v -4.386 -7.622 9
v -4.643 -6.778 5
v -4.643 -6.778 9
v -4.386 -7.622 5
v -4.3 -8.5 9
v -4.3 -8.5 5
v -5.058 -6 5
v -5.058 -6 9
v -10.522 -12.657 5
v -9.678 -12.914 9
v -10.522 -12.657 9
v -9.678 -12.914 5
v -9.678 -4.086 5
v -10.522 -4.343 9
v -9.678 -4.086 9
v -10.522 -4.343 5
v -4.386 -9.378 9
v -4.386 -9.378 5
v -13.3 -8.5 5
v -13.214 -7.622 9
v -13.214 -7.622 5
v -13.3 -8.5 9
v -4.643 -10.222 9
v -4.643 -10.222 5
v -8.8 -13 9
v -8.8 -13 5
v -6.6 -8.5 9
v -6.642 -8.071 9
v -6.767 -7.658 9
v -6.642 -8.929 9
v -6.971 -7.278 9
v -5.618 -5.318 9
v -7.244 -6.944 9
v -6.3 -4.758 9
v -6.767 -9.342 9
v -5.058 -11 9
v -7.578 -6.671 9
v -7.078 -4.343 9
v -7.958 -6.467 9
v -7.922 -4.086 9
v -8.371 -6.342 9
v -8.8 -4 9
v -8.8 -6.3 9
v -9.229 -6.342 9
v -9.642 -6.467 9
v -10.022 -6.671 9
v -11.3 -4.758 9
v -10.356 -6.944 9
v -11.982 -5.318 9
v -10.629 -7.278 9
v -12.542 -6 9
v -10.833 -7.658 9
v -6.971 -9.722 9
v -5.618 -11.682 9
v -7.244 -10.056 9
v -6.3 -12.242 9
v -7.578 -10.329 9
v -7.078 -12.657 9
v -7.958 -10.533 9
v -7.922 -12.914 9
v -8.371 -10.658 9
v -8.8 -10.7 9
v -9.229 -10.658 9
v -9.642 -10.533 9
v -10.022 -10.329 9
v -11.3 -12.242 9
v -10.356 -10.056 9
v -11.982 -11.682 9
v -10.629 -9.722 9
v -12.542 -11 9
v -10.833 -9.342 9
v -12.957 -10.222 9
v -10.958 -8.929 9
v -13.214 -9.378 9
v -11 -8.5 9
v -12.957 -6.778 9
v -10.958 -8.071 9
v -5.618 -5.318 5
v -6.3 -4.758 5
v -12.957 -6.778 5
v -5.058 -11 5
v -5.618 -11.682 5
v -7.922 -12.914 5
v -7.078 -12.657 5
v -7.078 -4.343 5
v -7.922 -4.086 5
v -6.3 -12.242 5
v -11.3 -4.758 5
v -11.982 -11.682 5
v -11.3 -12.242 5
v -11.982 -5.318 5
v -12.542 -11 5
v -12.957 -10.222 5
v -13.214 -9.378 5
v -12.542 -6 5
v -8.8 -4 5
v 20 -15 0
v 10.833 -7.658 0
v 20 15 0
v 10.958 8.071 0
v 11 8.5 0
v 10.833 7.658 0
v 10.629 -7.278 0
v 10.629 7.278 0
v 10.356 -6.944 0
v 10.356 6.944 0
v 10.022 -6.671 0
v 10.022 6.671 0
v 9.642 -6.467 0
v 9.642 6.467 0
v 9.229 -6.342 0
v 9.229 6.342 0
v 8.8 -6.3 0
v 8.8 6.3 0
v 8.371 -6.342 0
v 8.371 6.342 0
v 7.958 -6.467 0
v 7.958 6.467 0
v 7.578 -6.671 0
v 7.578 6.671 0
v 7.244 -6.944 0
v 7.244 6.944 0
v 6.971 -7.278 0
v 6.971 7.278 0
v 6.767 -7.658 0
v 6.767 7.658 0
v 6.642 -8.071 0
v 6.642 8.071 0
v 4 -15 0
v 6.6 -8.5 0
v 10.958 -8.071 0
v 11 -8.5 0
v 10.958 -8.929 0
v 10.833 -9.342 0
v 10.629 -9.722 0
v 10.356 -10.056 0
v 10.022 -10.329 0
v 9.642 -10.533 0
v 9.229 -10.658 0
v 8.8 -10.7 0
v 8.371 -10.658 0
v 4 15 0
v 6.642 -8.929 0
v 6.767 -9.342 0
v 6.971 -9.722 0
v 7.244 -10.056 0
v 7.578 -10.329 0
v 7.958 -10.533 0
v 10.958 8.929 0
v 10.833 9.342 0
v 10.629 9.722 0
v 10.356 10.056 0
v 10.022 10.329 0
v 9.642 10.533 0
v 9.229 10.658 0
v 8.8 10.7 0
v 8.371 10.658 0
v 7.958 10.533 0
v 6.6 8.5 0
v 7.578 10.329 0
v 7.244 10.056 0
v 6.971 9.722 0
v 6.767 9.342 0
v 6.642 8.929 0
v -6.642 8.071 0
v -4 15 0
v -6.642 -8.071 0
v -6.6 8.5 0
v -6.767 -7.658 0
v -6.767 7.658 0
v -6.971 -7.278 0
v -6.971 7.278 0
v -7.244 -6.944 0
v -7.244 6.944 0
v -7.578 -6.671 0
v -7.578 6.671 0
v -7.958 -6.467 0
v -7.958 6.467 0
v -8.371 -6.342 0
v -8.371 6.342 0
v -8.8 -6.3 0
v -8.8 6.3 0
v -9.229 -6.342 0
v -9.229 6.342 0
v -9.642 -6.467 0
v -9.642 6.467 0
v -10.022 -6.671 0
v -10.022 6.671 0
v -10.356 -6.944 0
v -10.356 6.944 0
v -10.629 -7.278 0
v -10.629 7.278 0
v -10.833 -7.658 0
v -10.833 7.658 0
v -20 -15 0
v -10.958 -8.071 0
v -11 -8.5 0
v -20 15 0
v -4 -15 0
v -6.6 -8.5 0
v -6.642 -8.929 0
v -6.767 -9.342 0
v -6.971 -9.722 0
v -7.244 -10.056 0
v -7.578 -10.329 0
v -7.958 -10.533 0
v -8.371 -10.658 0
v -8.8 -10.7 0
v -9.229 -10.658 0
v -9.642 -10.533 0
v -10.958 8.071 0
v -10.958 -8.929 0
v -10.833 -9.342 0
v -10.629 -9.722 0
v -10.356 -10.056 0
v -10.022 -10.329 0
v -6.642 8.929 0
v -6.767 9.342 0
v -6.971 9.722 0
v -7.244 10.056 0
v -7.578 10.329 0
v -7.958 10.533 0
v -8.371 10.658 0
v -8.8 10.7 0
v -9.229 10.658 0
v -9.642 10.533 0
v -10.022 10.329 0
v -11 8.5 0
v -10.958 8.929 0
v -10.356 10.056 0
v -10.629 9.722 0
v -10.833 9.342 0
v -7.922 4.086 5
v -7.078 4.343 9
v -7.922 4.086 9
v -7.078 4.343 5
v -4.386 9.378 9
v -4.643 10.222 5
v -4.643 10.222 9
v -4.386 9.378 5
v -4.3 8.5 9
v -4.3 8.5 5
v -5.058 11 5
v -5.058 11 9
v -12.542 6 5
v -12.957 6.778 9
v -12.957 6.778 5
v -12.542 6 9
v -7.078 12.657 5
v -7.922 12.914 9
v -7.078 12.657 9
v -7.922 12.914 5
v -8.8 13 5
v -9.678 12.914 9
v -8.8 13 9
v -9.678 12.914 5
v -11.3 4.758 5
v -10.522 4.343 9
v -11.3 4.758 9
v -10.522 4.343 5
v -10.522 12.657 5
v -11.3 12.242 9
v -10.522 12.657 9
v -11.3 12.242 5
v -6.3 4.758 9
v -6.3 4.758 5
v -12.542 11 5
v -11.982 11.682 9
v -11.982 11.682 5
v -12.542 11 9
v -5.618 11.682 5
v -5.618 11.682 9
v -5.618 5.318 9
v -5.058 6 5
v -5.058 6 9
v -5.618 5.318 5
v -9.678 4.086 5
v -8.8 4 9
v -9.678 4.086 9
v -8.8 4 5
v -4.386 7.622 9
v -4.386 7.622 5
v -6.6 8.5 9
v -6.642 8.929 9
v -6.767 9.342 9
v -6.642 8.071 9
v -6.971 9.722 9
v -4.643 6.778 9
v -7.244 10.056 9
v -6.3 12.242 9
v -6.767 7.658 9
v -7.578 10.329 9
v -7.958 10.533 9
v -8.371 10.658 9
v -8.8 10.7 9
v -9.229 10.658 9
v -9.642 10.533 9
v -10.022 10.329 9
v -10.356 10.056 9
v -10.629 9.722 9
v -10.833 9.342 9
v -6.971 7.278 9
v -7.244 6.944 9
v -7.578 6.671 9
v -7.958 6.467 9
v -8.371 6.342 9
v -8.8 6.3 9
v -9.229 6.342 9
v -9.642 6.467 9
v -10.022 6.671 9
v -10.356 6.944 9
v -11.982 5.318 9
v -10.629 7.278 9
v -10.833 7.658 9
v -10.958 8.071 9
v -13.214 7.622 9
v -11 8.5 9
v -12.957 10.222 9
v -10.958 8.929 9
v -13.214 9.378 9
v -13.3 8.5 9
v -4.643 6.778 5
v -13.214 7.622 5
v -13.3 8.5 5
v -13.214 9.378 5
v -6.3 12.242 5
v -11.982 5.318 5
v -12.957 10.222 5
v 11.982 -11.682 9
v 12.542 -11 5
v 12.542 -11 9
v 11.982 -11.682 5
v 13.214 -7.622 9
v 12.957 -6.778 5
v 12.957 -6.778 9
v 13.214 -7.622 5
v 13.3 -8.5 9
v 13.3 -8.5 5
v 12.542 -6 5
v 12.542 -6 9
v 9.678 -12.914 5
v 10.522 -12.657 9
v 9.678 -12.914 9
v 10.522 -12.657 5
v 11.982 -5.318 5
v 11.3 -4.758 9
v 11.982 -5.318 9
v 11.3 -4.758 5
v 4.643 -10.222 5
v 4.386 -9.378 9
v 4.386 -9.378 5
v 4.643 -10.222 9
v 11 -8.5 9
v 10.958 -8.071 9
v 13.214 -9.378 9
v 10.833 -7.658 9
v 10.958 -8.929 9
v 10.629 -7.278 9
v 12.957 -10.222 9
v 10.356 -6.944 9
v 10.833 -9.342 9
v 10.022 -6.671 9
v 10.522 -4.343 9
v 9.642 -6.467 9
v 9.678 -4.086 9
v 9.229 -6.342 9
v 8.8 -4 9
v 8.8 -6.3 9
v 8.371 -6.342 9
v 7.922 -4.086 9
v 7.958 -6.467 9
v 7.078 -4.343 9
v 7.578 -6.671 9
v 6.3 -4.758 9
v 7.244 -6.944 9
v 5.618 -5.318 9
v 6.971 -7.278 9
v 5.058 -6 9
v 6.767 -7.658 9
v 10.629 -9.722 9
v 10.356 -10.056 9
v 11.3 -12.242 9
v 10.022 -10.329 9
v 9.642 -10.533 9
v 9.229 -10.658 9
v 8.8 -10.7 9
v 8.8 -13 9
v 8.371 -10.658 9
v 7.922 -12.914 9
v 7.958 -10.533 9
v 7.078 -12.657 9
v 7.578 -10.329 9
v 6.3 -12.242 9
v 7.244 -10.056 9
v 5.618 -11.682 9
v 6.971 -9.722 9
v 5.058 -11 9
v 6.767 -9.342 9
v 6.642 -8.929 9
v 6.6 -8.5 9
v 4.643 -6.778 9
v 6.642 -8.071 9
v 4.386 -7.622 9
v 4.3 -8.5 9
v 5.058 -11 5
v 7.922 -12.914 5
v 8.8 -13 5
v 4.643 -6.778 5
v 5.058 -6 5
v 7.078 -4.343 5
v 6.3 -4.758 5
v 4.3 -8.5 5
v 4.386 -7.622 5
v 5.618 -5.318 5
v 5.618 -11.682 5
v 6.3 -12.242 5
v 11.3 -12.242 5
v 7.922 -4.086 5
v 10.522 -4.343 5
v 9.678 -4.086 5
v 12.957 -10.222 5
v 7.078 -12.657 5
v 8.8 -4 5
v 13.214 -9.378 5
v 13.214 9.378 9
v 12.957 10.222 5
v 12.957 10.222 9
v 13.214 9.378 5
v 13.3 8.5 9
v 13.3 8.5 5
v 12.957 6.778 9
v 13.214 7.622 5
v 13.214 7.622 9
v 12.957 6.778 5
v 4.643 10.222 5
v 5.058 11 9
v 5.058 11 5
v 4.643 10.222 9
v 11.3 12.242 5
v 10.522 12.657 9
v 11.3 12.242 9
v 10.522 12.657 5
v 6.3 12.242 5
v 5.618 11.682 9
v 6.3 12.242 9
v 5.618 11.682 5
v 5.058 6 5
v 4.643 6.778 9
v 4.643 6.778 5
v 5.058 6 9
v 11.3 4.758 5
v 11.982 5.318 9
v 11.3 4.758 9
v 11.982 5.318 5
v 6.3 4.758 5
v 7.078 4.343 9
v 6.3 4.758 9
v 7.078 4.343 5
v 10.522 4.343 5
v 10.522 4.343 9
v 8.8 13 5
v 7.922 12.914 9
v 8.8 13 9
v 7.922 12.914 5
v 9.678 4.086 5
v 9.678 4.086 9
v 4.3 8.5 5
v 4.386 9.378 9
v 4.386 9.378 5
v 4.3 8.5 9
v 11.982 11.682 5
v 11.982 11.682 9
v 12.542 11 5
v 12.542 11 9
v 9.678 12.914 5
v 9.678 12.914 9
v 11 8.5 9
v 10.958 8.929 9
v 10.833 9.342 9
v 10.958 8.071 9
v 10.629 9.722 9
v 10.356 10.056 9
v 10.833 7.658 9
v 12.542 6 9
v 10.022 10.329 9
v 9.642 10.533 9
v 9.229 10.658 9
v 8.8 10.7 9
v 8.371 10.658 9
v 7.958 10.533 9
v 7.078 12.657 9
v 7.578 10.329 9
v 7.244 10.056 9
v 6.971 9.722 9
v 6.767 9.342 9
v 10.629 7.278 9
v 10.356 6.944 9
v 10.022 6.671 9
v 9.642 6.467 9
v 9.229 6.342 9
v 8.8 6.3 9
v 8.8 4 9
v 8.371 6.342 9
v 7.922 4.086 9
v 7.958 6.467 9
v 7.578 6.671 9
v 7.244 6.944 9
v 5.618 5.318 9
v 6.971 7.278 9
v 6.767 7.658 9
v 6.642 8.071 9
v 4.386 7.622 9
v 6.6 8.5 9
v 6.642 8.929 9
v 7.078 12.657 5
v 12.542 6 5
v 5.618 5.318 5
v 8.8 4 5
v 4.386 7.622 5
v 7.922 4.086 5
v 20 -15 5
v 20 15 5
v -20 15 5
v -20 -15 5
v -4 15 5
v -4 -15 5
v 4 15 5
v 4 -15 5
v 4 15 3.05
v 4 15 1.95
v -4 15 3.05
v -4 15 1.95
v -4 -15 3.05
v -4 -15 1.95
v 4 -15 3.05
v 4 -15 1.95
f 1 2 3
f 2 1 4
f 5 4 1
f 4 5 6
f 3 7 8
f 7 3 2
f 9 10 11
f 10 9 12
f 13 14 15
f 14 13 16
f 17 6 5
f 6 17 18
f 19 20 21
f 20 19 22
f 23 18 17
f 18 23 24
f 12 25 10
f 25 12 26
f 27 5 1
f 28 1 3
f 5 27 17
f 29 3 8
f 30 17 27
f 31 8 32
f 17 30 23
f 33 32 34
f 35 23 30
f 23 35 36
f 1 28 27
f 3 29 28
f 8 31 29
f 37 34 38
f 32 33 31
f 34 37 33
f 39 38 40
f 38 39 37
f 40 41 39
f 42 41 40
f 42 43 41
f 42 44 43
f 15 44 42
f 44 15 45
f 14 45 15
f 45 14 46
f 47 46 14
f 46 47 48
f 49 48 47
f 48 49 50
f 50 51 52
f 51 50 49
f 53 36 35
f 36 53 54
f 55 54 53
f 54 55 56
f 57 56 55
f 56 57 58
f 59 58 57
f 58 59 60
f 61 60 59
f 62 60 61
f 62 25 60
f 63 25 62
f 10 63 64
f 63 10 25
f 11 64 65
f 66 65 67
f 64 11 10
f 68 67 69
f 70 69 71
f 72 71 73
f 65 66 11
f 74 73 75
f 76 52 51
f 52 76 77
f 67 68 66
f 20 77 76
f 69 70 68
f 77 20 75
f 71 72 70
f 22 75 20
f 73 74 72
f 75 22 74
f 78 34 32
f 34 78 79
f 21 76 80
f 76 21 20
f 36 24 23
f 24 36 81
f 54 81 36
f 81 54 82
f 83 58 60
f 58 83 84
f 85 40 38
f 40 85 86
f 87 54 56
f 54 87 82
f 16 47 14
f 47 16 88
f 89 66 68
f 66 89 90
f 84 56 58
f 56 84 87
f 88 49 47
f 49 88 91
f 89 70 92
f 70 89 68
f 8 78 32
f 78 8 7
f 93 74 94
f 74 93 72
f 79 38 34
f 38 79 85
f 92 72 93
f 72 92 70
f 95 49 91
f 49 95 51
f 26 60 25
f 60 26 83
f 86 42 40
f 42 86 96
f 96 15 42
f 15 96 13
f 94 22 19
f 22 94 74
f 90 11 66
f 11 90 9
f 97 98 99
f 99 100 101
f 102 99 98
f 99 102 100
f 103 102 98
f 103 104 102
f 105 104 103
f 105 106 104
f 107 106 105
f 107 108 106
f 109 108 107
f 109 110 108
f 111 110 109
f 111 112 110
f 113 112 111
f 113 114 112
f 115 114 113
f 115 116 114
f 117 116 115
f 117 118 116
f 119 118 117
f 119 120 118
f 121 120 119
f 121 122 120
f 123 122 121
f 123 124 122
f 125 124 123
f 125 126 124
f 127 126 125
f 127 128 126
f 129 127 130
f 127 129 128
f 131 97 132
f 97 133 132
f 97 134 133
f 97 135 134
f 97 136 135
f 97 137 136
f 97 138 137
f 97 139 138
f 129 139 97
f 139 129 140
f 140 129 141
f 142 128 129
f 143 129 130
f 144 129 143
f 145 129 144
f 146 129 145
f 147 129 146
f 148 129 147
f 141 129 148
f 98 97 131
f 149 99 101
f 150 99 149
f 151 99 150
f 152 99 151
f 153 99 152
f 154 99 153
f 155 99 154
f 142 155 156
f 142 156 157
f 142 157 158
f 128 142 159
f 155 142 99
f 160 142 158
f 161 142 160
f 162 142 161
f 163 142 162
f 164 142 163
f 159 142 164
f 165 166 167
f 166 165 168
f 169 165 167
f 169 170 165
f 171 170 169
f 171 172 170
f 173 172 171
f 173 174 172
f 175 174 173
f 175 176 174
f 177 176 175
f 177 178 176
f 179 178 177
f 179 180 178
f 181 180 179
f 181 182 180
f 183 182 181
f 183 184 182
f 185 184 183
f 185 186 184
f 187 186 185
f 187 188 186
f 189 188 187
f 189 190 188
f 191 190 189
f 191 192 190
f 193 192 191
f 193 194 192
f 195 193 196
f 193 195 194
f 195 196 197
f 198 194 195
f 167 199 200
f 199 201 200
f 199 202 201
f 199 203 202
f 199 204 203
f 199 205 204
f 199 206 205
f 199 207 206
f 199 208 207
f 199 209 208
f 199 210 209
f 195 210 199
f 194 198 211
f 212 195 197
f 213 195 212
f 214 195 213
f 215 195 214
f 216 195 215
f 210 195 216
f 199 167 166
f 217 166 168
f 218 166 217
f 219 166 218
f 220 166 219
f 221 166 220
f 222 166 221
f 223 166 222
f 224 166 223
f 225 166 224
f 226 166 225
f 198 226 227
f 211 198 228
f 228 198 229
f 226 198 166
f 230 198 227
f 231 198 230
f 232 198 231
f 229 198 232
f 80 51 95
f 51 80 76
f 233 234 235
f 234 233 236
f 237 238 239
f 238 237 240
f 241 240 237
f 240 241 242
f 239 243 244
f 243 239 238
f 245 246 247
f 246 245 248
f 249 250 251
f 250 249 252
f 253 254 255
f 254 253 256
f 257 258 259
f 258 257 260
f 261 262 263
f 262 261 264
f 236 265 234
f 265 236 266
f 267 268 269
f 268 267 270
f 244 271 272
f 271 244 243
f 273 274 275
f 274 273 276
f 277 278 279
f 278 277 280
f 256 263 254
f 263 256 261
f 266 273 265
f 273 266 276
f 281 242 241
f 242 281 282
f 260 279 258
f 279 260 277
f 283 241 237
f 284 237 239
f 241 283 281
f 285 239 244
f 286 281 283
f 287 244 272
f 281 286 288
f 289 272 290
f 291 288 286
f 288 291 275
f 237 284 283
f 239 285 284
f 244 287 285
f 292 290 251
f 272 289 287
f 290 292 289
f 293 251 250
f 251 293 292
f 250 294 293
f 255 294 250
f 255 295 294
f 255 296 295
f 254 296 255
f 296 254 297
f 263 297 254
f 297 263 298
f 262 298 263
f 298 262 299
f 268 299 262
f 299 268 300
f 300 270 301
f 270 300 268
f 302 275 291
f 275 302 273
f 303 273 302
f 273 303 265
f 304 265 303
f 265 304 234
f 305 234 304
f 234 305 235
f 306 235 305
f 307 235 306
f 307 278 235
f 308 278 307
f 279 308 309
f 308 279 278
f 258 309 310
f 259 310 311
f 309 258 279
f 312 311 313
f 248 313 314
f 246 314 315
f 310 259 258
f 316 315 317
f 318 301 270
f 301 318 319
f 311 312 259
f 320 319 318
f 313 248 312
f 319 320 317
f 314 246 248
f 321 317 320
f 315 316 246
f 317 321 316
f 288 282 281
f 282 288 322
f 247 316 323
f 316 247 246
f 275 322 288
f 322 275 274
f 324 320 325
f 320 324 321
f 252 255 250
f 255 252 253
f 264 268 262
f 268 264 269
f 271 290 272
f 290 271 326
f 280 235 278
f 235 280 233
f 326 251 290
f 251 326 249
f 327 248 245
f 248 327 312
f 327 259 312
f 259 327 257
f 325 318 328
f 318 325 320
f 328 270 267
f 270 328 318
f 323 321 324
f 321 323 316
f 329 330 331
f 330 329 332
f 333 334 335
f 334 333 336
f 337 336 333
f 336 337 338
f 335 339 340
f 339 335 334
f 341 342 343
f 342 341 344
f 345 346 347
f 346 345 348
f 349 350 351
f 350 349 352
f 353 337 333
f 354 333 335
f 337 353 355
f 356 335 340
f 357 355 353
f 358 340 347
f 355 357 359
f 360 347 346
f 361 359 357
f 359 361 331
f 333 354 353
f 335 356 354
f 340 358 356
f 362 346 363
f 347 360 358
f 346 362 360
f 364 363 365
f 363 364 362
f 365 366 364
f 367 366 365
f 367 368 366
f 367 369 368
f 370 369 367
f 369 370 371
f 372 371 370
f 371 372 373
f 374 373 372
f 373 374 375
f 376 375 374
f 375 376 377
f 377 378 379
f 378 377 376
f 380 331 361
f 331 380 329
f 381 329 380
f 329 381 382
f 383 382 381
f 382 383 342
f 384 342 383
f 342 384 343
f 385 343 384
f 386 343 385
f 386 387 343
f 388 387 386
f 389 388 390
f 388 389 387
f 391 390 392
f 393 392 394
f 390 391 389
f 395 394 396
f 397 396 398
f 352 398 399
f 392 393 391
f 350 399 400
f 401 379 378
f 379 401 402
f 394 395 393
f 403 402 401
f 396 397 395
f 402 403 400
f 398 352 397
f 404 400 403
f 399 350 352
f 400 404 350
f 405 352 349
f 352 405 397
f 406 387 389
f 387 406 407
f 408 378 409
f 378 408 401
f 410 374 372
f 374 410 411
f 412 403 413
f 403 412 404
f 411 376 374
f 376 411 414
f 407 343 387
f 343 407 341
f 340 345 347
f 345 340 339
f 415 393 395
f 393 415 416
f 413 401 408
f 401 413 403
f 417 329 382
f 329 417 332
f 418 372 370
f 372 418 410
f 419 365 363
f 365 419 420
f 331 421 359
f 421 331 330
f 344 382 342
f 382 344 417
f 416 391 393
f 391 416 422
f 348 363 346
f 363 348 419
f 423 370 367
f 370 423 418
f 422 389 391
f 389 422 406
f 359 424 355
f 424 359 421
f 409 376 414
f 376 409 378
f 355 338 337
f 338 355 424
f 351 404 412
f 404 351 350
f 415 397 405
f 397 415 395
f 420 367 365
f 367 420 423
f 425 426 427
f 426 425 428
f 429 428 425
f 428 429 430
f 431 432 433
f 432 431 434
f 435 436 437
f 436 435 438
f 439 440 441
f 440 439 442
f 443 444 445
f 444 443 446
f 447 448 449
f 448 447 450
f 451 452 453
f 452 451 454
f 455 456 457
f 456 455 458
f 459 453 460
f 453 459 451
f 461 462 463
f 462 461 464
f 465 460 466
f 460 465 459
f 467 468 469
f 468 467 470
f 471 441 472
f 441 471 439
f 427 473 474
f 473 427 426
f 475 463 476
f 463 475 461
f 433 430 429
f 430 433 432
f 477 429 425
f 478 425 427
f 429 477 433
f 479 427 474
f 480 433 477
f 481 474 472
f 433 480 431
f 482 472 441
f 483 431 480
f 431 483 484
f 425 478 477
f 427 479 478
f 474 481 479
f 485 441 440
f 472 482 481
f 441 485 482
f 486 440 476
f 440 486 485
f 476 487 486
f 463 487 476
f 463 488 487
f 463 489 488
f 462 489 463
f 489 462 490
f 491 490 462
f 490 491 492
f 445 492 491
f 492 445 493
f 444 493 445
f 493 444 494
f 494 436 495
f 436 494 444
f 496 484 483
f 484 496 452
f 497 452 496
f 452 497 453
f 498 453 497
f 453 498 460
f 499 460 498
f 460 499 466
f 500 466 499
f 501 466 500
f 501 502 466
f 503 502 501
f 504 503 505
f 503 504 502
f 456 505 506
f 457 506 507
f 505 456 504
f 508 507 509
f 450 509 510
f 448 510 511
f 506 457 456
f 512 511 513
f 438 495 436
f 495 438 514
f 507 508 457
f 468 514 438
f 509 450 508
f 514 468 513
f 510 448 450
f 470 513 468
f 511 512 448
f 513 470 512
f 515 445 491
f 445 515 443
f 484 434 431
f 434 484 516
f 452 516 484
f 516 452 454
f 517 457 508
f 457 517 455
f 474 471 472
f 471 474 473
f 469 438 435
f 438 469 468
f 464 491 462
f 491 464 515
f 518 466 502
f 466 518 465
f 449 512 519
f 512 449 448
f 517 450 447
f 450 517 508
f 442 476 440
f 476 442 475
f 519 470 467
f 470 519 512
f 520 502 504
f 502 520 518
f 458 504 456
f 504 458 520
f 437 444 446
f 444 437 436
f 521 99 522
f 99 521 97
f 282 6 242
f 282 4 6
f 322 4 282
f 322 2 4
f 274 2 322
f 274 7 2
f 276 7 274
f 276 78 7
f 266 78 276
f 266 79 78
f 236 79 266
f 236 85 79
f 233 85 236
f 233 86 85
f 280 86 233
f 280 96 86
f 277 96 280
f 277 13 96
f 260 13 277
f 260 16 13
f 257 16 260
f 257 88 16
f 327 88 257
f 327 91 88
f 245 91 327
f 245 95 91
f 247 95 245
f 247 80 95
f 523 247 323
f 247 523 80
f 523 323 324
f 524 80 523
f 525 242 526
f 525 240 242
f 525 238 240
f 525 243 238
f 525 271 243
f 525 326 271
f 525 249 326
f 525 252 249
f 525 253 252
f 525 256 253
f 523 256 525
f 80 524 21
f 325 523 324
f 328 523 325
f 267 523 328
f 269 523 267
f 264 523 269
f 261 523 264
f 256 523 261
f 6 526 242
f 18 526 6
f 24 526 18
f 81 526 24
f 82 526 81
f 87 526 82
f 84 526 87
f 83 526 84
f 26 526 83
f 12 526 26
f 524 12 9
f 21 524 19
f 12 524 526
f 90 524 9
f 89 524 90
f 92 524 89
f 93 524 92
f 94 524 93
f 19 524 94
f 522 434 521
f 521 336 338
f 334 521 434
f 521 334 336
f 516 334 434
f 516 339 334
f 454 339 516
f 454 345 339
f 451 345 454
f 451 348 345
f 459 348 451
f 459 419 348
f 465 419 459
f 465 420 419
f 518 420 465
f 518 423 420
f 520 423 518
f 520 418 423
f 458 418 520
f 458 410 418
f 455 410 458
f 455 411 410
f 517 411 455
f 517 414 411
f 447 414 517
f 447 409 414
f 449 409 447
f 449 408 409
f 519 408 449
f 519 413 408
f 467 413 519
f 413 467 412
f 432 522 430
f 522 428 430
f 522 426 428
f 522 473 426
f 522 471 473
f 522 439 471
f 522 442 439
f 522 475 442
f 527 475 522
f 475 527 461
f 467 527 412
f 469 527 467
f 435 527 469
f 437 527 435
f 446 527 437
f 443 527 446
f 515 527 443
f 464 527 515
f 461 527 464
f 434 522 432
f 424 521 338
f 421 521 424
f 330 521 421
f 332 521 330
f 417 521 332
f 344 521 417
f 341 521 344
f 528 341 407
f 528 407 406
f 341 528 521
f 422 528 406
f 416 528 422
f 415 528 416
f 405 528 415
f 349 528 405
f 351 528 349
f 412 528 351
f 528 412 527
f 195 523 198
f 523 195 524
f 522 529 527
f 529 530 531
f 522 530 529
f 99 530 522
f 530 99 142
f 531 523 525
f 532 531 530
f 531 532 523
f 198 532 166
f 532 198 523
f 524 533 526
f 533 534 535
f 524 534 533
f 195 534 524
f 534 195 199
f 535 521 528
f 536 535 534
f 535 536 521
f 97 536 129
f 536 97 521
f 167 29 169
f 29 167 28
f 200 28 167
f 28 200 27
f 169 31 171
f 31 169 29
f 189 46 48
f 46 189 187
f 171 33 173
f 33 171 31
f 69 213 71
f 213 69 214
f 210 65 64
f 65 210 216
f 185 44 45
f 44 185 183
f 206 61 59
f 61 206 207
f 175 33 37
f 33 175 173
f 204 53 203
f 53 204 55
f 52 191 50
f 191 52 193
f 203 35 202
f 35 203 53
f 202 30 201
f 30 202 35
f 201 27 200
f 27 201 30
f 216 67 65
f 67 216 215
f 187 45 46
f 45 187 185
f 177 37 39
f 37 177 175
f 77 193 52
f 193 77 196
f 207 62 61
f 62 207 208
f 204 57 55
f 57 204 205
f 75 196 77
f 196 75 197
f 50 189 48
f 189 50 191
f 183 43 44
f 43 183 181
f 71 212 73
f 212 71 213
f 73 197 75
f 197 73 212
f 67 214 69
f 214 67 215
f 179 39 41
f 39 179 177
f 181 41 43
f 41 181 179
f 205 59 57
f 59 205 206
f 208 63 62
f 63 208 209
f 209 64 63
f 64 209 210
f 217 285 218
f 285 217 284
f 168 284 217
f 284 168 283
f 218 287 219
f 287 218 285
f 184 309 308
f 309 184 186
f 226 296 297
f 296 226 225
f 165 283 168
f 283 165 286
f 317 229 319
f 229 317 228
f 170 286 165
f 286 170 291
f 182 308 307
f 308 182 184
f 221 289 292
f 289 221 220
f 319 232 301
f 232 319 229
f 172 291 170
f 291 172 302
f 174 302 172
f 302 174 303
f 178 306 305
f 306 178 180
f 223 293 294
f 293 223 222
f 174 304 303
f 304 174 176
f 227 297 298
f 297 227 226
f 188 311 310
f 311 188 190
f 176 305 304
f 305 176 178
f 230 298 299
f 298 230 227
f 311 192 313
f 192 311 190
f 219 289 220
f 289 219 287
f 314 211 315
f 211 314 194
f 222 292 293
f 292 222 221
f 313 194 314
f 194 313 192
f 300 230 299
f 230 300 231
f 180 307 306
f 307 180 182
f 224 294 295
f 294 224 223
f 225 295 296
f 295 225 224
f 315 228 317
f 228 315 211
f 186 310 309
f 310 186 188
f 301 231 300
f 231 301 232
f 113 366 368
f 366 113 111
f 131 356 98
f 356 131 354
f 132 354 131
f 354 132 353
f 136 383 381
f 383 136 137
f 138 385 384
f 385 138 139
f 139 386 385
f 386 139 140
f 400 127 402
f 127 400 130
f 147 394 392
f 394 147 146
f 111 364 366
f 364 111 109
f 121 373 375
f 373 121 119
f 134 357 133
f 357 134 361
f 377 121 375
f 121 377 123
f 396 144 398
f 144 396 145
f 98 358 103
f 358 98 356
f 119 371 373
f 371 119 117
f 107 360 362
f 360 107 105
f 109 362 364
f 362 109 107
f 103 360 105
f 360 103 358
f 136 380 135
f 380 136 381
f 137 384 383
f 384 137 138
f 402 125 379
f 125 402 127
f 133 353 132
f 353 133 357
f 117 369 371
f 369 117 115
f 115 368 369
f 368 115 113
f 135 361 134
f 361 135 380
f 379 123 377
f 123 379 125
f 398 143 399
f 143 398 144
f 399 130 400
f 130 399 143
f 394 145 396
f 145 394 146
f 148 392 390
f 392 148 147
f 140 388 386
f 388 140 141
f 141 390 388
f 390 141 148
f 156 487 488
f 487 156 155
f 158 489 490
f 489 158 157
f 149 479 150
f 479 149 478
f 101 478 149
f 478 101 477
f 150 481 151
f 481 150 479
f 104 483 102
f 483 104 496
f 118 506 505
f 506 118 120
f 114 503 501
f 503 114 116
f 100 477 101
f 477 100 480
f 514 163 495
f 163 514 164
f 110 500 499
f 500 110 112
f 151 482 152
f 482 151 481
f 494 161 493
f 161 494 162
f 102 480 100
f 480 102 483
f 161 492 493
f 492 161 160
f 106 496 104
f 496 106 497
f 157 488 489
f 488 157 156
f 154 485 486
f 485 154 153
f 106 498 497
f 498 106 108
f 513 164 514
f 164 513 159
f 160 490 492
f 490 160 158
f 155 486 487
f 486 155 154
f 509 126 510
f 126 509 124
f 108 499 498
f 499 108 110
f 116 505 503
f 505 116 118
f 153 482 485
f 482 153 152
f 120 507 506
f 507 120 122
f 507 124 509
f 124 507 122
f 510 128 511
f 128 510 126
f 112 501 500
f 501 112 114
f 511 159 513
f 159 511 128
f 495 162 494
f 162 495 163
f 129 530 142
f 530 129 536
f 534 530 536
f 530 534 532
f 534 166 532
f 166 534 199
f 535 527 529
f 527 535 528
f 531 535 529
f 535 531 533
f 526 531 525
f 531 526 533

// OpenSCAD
$fn = 32;

// ----------------------------------------------------------------------
// Living hinge: 40 x 30 mm plates, 1.1 mm flexible web
// ----------------------------------------------------------------------

// --- parameters (mm) ---
plate_len = 16;           // plate length outside the web
plate_w = 30;             // plate width
thick = 5;                // plate thickness
web_half = 4;             // half width of the flex band
web_t = 1.1;              // flexible web thickness
web_z = 1.95;             // web position inside the thickness
boss_d = 9;               // screw boss diameter
boss_h = 9;               // screw boss height
boss_x = 8.8;             // screw boss distance from the web
screw_d = 4.4;            // screw hole

difference() {
  union() {
    /* one flat strip, later thinned at the middle */
    translate([-20, -15, 0]) cube([40, 30, 5]);
    /* screw bosses, sunk 0.5 mm into the plates */
    for (sx = [-8.8, 8.8]) {
      for (sy = [-8.5, 8.5]) {
        translate([sx, sy, 0]) cylinder(h = boss_h, d = boss_d);
      }
    }
  }
  /* channel from below: leaves the web on top of it */
  translate([-4, -17.5, -2.5]) cube([8, 35, 4.45]);
  /* channel from above: thins the web down to web_t */
  translate([-4, -17.5, 3.05]) cube([8, 35, 4.45]);
  /* screw holes through the bosses */
  for (sx = [-8.8, 8.8]) {
    for (sy = [-8.5, 8.5]) {
      translate([sx, sy, -2.5]) cylinder(h = boss_h + 5, d = screw_d);
    }
  }
}
